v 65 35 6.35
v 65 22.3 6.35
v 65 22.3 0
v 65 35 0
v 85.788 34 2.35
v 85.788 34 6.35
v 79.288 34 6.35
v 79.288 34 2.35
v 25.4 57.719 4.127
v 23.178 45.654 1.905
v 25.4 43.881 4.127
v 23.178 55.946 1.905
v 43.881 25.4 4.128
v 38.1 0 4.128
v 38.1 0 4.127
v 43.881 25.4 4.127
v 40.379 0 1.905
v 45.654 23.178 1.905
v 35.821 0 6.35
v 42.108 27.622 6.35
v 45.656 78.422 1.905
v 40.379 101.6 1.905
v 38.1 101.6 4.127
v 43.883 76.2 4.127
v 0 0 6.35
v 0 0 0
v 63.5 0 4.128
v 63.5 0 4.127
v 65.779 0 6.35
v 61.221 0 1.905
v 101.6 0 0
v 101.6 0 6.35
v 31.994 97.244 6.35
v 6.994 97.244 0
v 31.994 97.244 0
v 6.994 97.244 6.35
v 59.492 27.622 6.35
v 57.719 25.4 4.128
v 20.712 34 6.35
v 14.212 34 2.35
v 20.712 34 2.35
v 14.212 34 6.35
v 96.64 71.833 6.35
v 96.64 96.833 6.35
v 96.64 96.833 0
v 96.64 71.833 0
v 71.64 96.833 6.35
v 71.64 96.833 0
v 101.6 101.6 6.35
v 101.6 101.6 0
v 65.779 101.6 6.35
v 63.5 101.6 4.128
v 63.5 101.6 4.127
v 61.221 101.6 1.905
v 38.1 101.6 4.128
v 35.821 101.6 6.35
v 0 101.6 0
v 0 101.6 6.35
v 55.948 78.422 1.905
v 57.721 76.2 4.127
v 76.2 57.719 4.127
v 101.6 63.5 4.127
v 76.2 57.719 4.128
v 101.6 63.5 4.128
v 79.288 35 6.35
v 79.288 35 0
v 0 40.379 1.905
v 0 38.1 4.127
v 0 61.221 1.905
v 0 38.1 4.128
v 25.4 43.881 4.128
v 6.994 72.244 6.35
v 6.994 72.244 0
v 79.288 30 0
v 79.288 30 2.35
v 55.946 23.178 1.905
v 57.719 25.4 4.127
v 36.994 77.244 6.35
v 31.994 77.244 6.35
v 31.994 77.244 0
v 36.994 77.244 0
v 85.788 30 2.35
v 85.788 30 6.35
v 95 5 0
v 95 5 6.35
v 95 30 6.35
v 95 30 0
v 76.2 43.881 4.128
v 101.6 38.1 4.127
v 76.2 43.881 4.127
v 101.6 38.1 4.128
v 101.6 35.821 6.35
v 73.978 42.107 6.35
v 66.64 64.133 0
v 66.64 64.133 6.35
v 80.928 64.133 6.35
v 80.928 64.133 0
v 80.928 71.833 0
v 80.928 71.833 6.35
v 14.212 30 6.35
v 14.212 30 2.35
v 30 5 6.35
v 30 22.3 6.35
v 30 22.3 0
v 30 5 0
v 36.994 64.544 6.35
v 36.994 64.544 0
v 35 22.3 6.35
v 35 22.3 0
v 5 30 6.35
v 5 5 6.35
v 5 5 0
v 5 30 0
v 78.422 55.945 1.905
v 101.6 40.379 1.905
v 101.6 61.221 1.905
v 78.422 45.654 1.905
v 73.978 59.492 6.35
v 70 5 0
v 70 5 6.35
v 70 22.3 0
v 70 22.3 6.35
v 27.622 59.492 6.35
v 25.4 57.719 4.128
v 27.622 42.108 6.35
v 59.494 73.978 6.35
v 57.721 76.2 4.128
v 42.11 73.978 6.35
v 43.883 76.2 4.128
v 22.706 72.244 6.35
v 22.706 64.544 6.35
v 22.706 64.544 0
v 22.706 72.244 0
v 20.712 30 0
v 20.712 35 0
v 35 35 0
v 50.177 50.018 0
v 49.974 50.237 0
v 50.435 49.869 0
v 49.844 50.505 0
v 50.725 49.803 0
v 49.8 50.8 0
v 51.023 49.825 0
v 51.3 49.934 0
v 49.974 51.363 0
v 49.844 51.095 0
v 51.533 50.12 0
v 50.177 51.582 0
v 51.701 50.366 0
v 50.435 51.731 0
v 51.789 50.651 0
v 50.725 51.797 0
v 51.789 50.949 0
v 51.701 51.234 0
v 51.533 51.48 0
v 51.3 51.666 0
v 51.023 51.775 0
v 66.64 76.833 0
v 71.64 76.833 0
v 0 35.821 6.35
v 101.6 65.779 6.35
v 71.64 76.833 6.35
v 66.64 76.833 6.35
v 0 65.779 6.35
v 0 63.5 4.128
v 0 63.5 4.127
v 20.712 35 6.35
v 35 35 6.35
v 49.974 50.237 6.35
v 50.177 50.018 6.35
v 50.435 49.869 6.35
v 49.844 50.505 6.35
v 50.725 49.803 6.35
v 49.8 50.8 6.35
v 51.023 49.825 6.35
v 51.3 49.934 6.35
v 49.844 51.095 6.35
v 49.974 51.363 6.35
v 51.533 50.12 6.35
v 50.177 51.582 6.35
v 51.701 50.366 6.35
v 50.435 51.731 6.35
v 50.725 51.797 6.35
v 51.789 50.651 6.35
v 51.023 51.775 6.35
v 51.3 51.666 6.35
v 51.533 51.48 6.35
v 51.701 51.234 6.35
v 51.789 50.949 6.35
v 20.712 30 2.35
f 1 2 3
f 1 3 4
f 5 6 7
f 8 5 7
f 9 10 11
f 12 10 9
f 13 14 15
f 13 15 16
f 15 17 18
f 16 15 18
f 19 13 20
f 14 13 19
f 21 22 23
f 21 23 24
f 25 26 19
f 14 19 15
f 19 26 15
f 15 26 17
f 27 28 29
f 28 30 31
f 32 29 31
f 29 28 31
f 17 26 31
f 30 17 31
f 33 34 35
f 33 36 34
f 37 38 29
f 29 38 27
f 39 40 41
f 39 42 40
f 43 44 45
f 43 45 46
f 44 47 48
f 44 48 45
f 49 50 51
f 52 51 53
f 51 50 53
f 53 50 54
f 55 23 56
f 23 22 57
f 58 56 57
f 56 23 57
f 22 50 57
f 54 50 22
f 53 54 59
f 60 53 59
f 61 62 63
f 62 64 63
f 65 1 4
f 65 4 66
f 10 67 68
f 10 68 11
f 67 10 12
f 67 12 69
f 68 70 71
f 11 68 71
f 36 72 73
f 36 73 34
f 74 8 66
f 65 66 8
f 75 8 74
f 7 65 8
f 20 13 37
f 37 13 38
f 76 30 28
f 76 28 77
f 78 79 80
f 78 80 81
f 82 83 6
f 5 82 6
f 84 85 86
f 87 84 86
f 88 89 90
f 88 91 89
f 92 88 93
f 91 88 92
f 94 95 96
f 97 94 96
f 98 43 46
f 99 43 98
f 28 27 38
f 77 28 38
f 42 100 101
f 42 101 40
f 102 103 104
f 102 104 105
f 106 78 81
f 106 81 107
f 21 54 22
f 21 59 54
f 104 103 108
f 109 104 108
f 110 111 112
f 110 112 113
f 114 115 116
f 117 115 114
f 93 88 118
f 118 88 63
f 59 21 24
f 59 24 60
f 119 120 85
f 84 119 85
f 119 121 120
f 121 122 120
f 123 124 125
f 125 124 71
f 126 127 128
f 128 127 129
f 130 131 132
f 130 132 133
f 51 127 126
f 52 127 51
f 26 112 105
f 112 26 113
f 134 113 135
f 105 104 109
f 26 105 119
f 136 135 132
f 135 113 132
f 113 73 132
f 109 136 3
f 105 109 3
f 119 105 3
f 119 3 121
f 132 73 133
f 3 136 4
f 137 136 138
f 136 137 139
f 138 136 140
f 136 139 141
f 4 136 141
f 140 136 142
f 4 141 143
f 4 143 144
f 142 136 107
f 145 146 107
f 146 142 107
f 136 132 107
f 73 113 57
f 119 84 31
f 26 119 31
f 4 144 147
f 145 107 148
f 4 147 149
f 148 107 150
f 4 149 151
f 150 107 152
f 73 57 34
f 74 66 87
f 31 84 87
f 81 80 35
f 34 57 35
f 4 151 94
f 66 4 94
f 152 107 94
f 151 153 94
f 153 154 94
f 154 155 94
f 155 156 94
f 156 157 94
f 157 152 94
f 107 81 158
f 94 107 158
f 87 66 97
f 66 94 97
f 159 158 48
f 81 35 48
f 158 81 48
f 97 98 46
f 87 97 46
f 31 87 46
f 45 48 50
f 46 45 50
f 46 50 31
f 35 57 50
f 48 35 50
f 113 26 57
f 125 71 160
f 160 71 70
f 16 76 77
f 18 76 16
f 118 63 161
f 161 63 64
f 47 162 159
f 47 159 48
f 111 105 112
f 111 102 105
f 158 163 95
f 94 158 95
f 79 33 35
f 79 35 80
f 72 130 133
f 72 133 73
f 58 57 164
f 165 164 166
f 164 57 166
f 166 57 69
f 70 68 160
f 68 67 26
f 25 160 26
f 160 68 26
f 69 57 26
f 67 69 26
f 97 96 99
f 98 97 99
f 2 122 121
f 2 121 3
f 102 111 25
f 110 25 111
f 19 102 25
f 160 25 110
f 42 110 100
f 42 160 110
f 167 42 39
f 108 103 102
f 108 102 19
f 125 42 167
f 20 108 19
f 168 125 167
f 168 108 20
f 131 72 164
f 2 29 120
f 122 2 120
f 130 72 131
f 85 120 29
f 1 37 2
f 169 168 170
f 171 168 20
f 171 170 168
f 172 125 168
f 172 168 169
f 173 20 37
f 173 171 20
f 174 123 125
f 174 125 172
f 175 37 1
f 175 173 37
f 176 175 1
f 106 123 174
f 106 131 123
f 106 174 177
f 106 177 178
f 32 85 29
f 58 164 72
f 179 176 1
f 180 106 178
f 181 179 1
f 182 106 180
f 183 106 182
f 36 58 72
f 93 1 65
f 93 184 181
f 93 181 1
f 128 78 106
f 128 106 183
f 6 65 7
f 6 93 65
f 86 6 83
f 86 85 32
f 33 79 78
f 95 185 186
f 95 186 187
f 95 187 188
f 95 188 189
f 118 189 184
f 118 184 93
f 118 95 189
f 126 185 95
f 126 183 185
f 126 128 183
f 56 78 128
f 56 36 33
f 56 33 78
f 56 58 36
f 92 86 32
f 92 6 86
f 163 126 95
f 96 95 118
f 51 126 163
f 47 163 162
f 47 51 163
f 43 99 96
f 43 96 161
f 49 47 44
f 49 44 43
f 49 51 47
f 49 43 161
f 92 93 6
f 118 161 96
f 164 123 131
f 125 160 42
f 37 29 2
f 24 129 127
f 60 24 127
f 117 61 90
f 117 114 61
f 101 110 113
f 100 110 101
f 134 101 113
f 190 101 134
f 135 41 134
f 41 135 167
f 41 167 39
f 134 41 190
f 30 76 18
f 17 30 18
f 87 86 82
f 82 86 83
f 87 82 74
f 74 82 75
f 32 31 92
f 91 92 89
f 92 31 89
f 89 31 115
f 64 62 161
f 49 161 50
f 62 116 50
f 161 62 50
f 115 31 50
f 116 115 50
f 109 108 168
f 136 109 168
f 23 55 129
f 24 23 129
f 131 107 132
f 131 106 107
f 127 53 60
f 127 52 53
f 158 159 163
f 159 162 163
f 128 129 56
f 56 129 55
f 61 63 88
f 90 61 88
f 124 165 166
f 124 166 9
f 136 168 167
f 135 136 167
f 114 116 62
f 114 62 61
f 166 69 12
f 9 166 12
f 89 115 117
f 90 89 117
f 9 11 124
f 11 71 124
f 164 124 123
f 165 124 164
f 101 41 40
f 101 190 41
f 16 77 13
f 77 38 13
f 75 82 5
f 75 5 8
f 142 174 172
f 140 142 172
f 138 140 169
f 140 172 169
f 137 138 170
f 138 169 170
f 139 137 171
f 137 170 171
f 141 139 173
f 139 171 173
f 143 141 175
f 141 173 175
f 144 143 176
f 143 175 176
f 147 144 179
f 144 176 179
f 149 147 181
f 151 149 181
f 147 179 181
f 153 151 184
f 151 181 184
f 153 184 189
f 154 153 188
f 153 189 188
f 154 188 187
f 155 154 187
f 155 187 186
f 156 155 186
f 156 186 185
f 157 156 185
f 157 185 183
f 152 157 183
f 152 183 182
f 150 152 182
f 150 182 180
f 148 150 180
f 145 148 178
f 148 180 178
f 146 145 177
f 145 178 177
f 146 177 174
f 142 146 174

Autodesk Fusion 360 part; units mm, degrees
sketch "Sketch1" plane through (0, 0, 0) normal (0, 0, 1) x (1, 0, 0)
  line L0 (0, 0) -> (10, 0)
  line L1 (10, 0) -> (101.6, 0)
  line L2 (101.6, 0) -> (101.6, 101.6)
  line L3 (101.6, 101.6) -> (0, 101.6)
  line L4 (0, 101.6) -> (0, 0)
  dimension "d32" = 101.6
  dimension "d55" = 101.6
  dimension "d56" = 101.6
extrude "Extrude1" add sketch "Sketch1" along normal blind 6.35
sketch "Sketch2" plane through (0, 0, 6.35) normal (0, 0, 1) x (-1, 0, 0)
  line L0 (0, -101.6) -> (0, 0)
  line L1 (0, 0) -> (-101.6, 0)
  line L2 (-101.6, 0) -> (-101.6, -101.6)
  line L3 (-101.6, -101.6) -> (0, -101.6)
  line L4 (0, 0) -> (-50.8, 0)
  line L5 (0, 0) -> (0, -50.8)
  circle A0 centre (-50.8, -50.8) radius 1
  line L6 (0, -50.8) -> (-49.8, -50.8)
  line L7 (-51.8, -50.8) -> (-101.6, -50.8)
  line L8 (-50.8, 0) -> (-50.8, -49.8)
  line L9 (-50.8, -51.8) -> (-50.8, -101.6)
  dimension "d33" = 50.8
  dimension "d34" = 50.8
  dimension "d35" = 2
extrude "Extrude2" cut sketch "Sketch2" against normal blind 6.35 contours A0
sketch "Sketch3" plane through (0, 0, 6.35) normal (0, 0, 1) x (-1, 0, 0)
  line L0 (0, -101.6) -> (0, 0)
  line L1 (0, 0) -> (-101.6, 0)
  line L2 (-101.6, 0) -> (-101.6, -101.6)
  line L3 (-101.6, -101.6) -> (0, -101.6)
  line L4 (0, -50.8) -> (0, -38.1)
  line L5 (0, -50.8) -> (0, -63.5)
  line L6 (-50.8, -101.6) -> (-38.1, -101.6)
  line L7 (-50.8, -101.6) -> (-63.5, -101.6)
  line L8 (-101.6, -50.8) -> (-101.6, -63.5)
  line L9 (-101.6, -50.8) -> (-101.6, -38.1)
  line L10 (-50.8, 0) -> (-38.1, 0)
  line L11 (-50.8, 0) -> (-63.5, 0)
  line L12 (-50.8019, -76.2) -> (-43.8829, -76.2)
  line L13 (-50.8019, -76.2) -> (-57.7209, -76.2)
  line L14 (-25.4, -50.8) -> (-25.4, -43.881)
  line L15 (-25.4, -50.8) -> (-25.4, -57.719)
  line L16 (-76.2, -50.7996) -> (-76.2, -57.7186)
  line L17 (-76.2, -50.7996) -> (-76.2, -43.8806)
  line L18 (-38.1, 0) -> (-43.881, -25.4)
  line L19 (-63.5, 0) -> (-57.719, -25.4)
  line L20 (0, -38.1) -> (-25.4, -43.881)
  line L21 (0, -63.5) -> (-25.4, -57.719)
  line L22 (-38.1, -101.6) -> (-43.8829, -76.2)
  line L23 (-63.5, -101.6) -> (-57.7209, -76.2)
  line L24 (-101.6, -63.5) -> (-76.2, -57.7186)
  line L25 (-101.6, -38.1) -> (-76.2, -43.8806)
  circle A0 centre (-50.8, -50.8) radius 1
  line L26 (-50.8, -25.4) -> (-43.881, -25.4)
  line L27 (-50.8, -25.4) -> (-57.719, -25.4)
  dimension "d8" = 12.7
  dimension "d9" = 12.7
  dimension "d10" = 12.7
  dimension "d11" = 12.7
  dimension "d12" = 12.7
  dimension "d13" = 12.7
  dimension "d14" = 12.7
  dimension "d15" = 12.7
  dimension "d17" = 25.4
  dimension "d18" = 25.4
  dimension "d36" = 6.919
  dimension "d37" = 6.919
  dimension "d40" = 6.919
  dimension "d41" = 6.919
  dimension "d42" = 25.4
  dimension "d43" = 26.0496
  dimension "d44" = 26.0496
  dimension "d45" = 26.0496
  dimension "d46" = 6.919
  dimension "d47" = 6.919
  dimension "d48" = 6.919
  dimension "d49" = 6.919
  dimension "d50" = 25.4
  dimension "d51" = 25.4
  dimension "d52" = 26.05
extrude "Extrude3" cut sketch "Sketch3" against normal blind 4.445 contours L0 L4 L5 L14 L15 L20 L21 | L3 L6 L7 L12 L13 L22 L23 | L1 L10 L11 L18 L19 L26 L27 | L2 L8 L9 L16 L17 L24 L25
chamfer "Chamfer1" distance 2.2225 angle 45 6 edges at (40.9905, 12.7, 6.35) (40.9905, 12.7, 1.905) (60.6095, 12.7, 6.35) (60.6095, 12.7, 1.905) (50.8, 25.4, 1.905) (50.8, 25.4, 6.35) measured on face at (23.0943, 78.5063, 6.35) measured on face at (40.027, 8.4667, 4.8683) measured on face at (23.0943, 78.5063, 6.35) measured on face at (61.573, 8.4667, 4.8683) measured on face at (53.1063, 25.4, 4.8683) measured on face at (23.0943, 78.5063, 6.35)
chamfer "Chamfer2" distance 2.2225 angle 45 6 edges at (88.9, 60.6093, 1.905) (88.9, 60.6093, 6.35) (76.2, 50.7996, 6.35) (76.2, 50.7996, 1.905) (88.9, 40.9903, 6.35) (88.9, 40.9903, 1.905) measured on face at (93.1333, 61.5729, 4.8683) measured on face at (14.036, 21.9074, 6.35) measured on face at (14.036, 21.9074, 6.35) measured on face at (76.2, 53.1059, 4.8683) measured on face at (14.036, 21.9074, 6.35) measured on face at (93.1333, 40.0269, 4.8683)
chamfer "Chamfer3" distance 2.2225 angle 45 6 edges at (60.6105, 88.9, 6.35) (60.6105, 88.9, 1.905) (50.8019, 76.2, 6.35) (50.8019, 76.2, 1.905) (40.9915, 88.9, 6.35) (40.9915, 88.9, 1.905) measured on face at (79.6926, 87.5639, 6.35) measured on face at (61.5736, 93.1333, 4.8683) measured on face at (79.6926, 87.5639, 6.35) measured on face at (48.4956, 76.2, 4.8683) measured on face at (79.6926, 87.5639, 6.35) measured on face at (40.0276, 93.1333, 4.8683)
chamfer "Chamfer4" distance 2.2225 angle 45 6 edges at (12.7, 60.6095, 1.905) (12.7, 60.6095, 6.35) (25.4, 50.8, 6.35) (25.4, 50.8, 1.905) (12.7, 40.9905, 6.35) (12.7, 40.9905, 1.905) measured on face at (16.9333, 59.646, 3.3867) measured on face at (14.0366, 79.6926, 6.35) measured on face at (14.0366, 79.6926, 6.35) measured on face at (25.4, 48.4937, 4.8683) measured on face at (14.0366, 79.6926, 6.35) measured on face at (8.4667, 40.027, 4.8683)
sketch "Sketch5" plane through (0, 0, 6.35) normal (0, 0, 1) x (-1, 0, 0)
  line L0 (0, -65.7793) -> (-27.6225, -59.4925)
  line L1 (-27.6225, -59.4925) -> (-27.6225, -42.1075)
  line L2 (-27.6225, -42.1075) -> (0, -35.8207)
  line L3 (0, -35.8207) -> (0, 0)
  line L4 (0, 0) -> (-35.8207, 0)
  line L5 (-35.8207, 0) -> (-42.1075, -27.6225)
  line L6 (-42.1075, -27.6225) -> (-59.4925, -27.6225)
  line L7 (-59.4925, -27.6225) -> (-65.7793, 0)
  line L8 (-65.7793, 0) -> (-101.6, 0)
  line L9 (-101.6, 0) -> (-101.6, -35.8207)
  line L10 (-101.6, -35.8207) -> (-73.9775, -42.1071)
  line L11 (-73.9775, -42.1071) -> (-73.9775, -59.4921)
  line L12 (-73.9775, -59.4921) -> (-101.6, -65.7793)
  line L13 (-101.6, -65.7793) -> (-101.6, -101.6)
  line L14 (-101.6, -101.6) -> (-65.7793, -101.6)
  line L15 (-65.7793, -101.6) -> (-59.4946, -73.9775)
  line L16 (-59.4946, -73.9775) -> (-42.1096, -73.9775)
  line L17 (-42.1096, -73.9775) -> (-35.8206, -101.6)
  line L18 (-35.8206, -101.6) -> (0, -101.6)
  line L19 (0, -101.6) -> (0, -65.7793)
  circle A0 centre (-50.8, -50.8) radius 1
  line L20 (-5, -30) -> (-20.7125, -30)
  line L21 (-30, -22.3) -> (-30, -5)
  line L22 (-30, -5) -> (-5, -5)
  line L23 (-5, -5) -> (-5, -30)
  line L24 (-6.9943, -97.2437) -> (-31.9943, -97.2437)
  line L25 (-31.9943, -97.2437) -> (-31.9943, -77.2437)
  line L26 (-22.7063, -72.2437) -> (-6.9943, -72.2437)
  line L27 (-6.9943, -72.2437) -> (-6.9943, -97.2437)
  line L28 (-71.6399, -96.8328) -> (-96.6399, -96.8328)
  line L29 (-96.6399, -96.8328) -> (-96.6399, -71.8328)
  line L30 (-96.6399, -71.8328) -> (-80.9279, -71.8328)
  line L31 (-71.6399, -76.8328) -> (-71.6399, -96.8328)
  line L32 (-70, -5) -> (-95, -5)
  line L33 (-95, -5) -> (-95, -30)
  line L34 (-95, -30) -> (-79.288, -30)
  line L35 (-70, -22.3) -> (-70, -5)
  line L36 (-65, -35) -> (-79.288, -35)
  line L37 (-79.288, -35) -> (-79.288, -30)
  line L38 (-70, -22.3) -> (-65, -22.3)
  line L39 (-65, -22.3) -> (-65, -35)
  line L40 (-35, -35) -> (-20.7125, -35)
  line L41 (-20.7125, -35) -> (-20.7125, -30)
  line L42 (-30, -22.3) -> (-35, -22.3)
  line L43 (-35, -22.3) -> (-35, -35)
  line L44 (-31.9943, -77.2437) -> (-36.9943, -77.2437)
  line L45 (-36.9943, -77.2437) -> (-36.9943, -64.5437)
  line L46 (-36.9943, -64.5437) -> (-22.7063, -64.5437)
  line L47 (-22.7063, -64.5437) -> (-22.7063, -72.2437)
  line L48 (-71.6399, -76.8328) -> (-66.6399, -76.8328)
  line L49 (-66.6399, -76.8328) -> (-66.6399, -64.1328)
  line L50 (-66.6399, -64.1328) -> (-80.9279, -64.1328)
  line L51 (-80.9279, -64.1328) -> (-80.9279, -71.8328)
  line L52 (-35, -35) -> (-20.7125, -35)
  line L53 (-20.7125, -35) -> (-20.7125, -30)
  line L54 (-30, -22.3) -> (-35, -22.3)
  line L55 (-35, -22.3) -> (-35, -35)
  dimension "d57" = 14.2875
  dimension "d58" = 12.7
  dimension "d59" = 14.2875
  dimension "d60" = 12.7
  dimension "d61" = 14.288
  dimension "d62" = 12.7
  dimension "d63" = 14.288
  dimension "d64" = 12.7
  dimension "d65" = 12.7
  dimension "d66" = 14.288
extrude "Extrude5" cut sketch "Sketch5" against normal blind 6.35 contours L20 L21 L22 L23 L40 L41 L42 L43 L52 L53 L54 L55 | L24 L25 L26 L27 L44 L45 L46 L47 | L28 L29 L30 L31 L48 L49 L50 L51 | L32 L33 L34 L35 L36 L37 L38 L39
sketch "Sketch6" plane through (0, 0, 6.35) normal (0, 0, 1) x (-1, 0, 0)
  line L0 (-35, -35) -> (-35, -22.3)
  line L1 (-35, -22.3) -> (-30, -22.3)
  line L2 (-30, -22.3) -> (-30, -5)
  line L3 (-30, -5) -> (-5, -5)
  line L4 (-5, -5) -> (-5, -30)
  line L5 (-5, -30) -> (-20.7125, -30)
  line L6 (-20.7125, -30) -> (-20.7125, -35)
  line L7 (-20.7125, -35) -> (-35, -35)
  line L8 (-66.6399, -64.1328) -> (-66.6399, -76.8328)
  line L9 (-66.6399, -76.8328) -> (-71.6399, -76.8328)
  line L10 (-71.6399, -76.8328) -> (-71.6399, -96.8328)
  line L11 (-71.6399, -96.8328) -> (-96.6399, -96.8328)
  line L12 (-96.6399, -96.8328) -> (-96.6399, -71.8328)
  line L13 (-96.6399, -71.8328) -> (-80.9279, -71.8328)
  line L14 (-80.9279, -71.8328) -> (-80.9279, -64.1328)
  line L15 (-80.9279, -64.1328) -> (-66.6399, -64.1328)
  line L16 (-36.9943, -77.2437) -> (-36.9943, -64.5437)
  line L17 (-36.9943, -64.5437) -> (-22.7063, -64.5437)
  line L18 (-22.7063, -64.5437) -> (-22.7063, -72.2437)
  line L19 (-22.7063, -72.2437) -> (-6.9943, -72.2437)
  line L20 (-6.9943, -72.2437) -> (-6.9943, -97.2437)
  line L21 (-6.9943, -97.2437) -> (-31.9943, -97.2437)
  line L22 (-31.9943, -97.2437) -> (-31.9943, -77.2437)
  line L23 (-31.9943, -77.2437) -> (-36.9943, -77.2437)
  line L24 (-95, -5) -> (-70, -5)
  line L25 (-70, -5) -> (-70, -22.3)
  line L26 (-70, -22.3) -> (-65, -22.3)
  line L27 (-65, -22.3) -> (-65, -35)
  line L28 (-65, -35) -> (-79.288, -35)
  line L29 (-79.288, -35) -> (-79.288, -30)
  line L30 (-79.288, -30) -> (-95, -30)
  line L31 (-95, -30) -> (-95, -5)
  line L32 (0, -65.7793) -> (-27.6225, -59.4925)
  line L33 (-27.6225, -59.4925) -> (-27.6225, -42.1075)
  line L34 (-27.6225, -42.1075) -> (0, -35.8207)
  line L35 (0, -35.8207) -> (0, 0)
  line L36 (0, 0) -> (-35.8207, 0)
  line L37 (-35.8207, 0) -> (-42.1075, -27.6225)
  line L38 (-42.1075, -27.6225) -> (-59.4925, -27.6225)
  line L39 (-59.4925, -27.6225) -> (-65.7793, 0)
  line L40 (-65.7793, 0) -> (-101.6, 0)
  line L41 (-101.6, 0) -> (-101.6, -35.8207)
  line L42 (-101.6, -35.8207) -> (-73.9775, -42.1071)
  line L43 (-73.9775, -42.1071) -> (-73.9775, -59.4921)
  line L44 (-73.9775, -59.4921) -> (-101.6, -65.7793)
  line L45 (-101.6, -65.7793) -> (-101.6, -101.6)
  line L46 (-101.6, -101.6) -> (-65.7793, -101.6)
  line L47 (-65.7793, -101.6) -> (-59.4946, -73.9775)
  line L48 (-59.4946, -73.9775) -> (-42.1096, -73.9775)
  line L49 (-42.1096, -73.9775) -> (-35.8206, -101.6)
  line L50 (-35.8206, -101.6) -> (0, -101.6)
  line L51 (0, -101.6) -> (0, -65.7793)
  circle A0 centre (-50.8, -50.8) radius 1
  line L52 (-70, -22.3) -> (-66, -22.3)
  line L53 (-66, -22.3) -> (-66, -15.8)
  line L54 (-66, -15.8) -> (-70, -15.8)
  line L55 (-70, -22.3) -> (-70, -15.8)
  line L56 (-30, -22.3) -> (-34, -22.3)
  line L57 (-34, -22.3) -> (-34, -15.8)
  line L58 (-34, -15.8) -> (-30, -15.8)
  line L59 (-30, -22.3) -> (-30, -15.8)
  dimension "d67" = 4
  dimension "d68" = 6.5
  dimension "d69" = 4
  dimension "d70" = 6.5
sketch "Sketch7" plane through (0, 0, 6.35) normal (0, 0, 1) x (-1, 0, 0)
  circle A0 centre (-50.8, -50.8) radius 1
  line L0 (0, -65.7793) -> (-27.6225, -59.4925)
  line L1 (-27.6225, -59.4925) -> (-27.6225, -42.1075)
  line L2 (-27.6225, -42.1075) -> (0, -35.8207)
  line L3 (0, -35.8207) -> (0, 0)
  line L4 (0, 0) -> (-35.8207, 0)
  line L5 (-35.8207, 0) -> (-42.1075, -27.6225)
  line L6 (-42.1075, -27.6225) -> (-59.4925, -27.6225)
  line L7 (-59.4925, -27.6225) -> (-65.7793, 0)
  line L8 (-65.7793, 0) -> (-101.6, 0)
  line L9 (-101.6, 0) -> (-101.6, -35.8207)
  line L10 (-101.6, -35.8207) -> (-73.9775, -42.1071)
  line L11 (-73.9775, -42.1071) -> (-73.9775, -59.4921)
  line L12 (-73.9775, -59.4921) -> (-101.6, -65.7793)
  line L13 (-101.6, -65.7793) -> (-101.6, -101.6)
  line L14 (-101.6, -101.6) -> (-65.7793, -101.6)
  line L15 (-65.7793, -101.6) -> (-59.4946, -73.9775)
  line L16 (-59.4946, -73.9775) -> (-42.1096, -73.9775)
  line L17 (-42.1096, -73.9775) -> (-35.8206, -101.6)
  line L18 (-35.8206, -101.6) -> (0, -101.6)
  line L19 (0, -101.6) -> (0, -65.7793)
  line L20 (-70, -22.3) -> (-65, -22.3)
  line L21 (-65, -22.3) -> (-65, -35)
  line L22 (-65, -35) -> (-79.288, -35)
  line L23 (-79.288, -35) -> (-79.288, -30)
  line L24 (-79.288, -30) -> (-95, -30)
  line L25 (-95, -30) -> (-95, -5)
  line L26 (-95, -5) -> (-70, -5)
  line L27 (-70, -5) -> (-70, -22.3)
  line L28 (-36.9943, -77.2437) -> (-36.9943, -64.5437)
  line L29 (-36.9943, -64.5437) -> (-22.7063, -64.5437)
  line L30 (-22.7063, -64.5437) -> (-22.7063, -72.2437)
  line L31 (-22.7063, -72.2437) -> (-6.9943, -72.2437)
  line L32 (-6.9943, -72.2437) -> (-6.9943, -97.2437)
  line L33 (-6.9943, -97.2437) -> (-31.9943, -97.2437)
  line L34 (-31.9943, -97.2437) -> (-31.9943, -77.2437)
  line L35 (-31.9943, -77.2437) -> (-36.9943, -77.2437)
  line L36 (-66.6399, -64.1328) -> (-66.6399, -76.8328)
  line L37 (-66.6399, -76.8328) -> (-71.6399, -76.8328)
  line L38 (-71.6399, -76.8328) -> (-71.6399, -96.8328)
  line L39 (-71.6399, -96.8328) -> (-96.6399, -96.8328)
  line L40 (-96.6399, -96.8328) -> (-96.6399, -71.8328)
  line L41 (-96.6399, -71.8328) -> (-80.9279, -71.8328)
  line L42 (-80.9279, -71.8328) -> (-80.9279, -64.1328)
  line L43 (-80.9279, -64.1328) -> (-66.6399, -64.1328)
  line L44 (-30, -22.3) -> (-30, -5)
  line L45 (-30, -5) -> (-5, -5)
  line L46 (-5, -5) -> (-5, -30)
  line L47 (-5, -30) -> (-20.7125, -30)
  line L48 (-20.7125, -30) -> (-20.7125, -35)
  line L49 (-20.7125, -35) -> (-35, -35)
  line L50 (-35, -35) -> (-35, -22.3)
  line L51 (-35, -22.3) -> (-30, -22.3)
  line L52 (-79.288, -30) -> (-85.788, -30)
  line L53 (-85.788, -30) -> (-85.788, -34)
  line L54 (-85.788, -34) -> (-79.288, -34)
  line L55 (-79.288, -30) -> (-79.288, -34)
  line L56 (-20.7125, -30) -> (-14.2125, -30)
  line L57 (-14.2125, -30) -> (-14.2125, -34)
  line L58 (-14.2125, -34) -> (-20.7125, -34)
  line L59 (-20.7125, -30) -> (-20.7125, -34)
  dimension "d73" = 6.5
  dimension "d74" = 4
  dimension "d75" = 6.5
  dimension "d76" = 4
extrude "Extrude7" cut sketch "Sketch7" against normal blind 4 contours L23 L24 L52 L53 L54 L55 | L47 L48 L56 L57 L58 L59
